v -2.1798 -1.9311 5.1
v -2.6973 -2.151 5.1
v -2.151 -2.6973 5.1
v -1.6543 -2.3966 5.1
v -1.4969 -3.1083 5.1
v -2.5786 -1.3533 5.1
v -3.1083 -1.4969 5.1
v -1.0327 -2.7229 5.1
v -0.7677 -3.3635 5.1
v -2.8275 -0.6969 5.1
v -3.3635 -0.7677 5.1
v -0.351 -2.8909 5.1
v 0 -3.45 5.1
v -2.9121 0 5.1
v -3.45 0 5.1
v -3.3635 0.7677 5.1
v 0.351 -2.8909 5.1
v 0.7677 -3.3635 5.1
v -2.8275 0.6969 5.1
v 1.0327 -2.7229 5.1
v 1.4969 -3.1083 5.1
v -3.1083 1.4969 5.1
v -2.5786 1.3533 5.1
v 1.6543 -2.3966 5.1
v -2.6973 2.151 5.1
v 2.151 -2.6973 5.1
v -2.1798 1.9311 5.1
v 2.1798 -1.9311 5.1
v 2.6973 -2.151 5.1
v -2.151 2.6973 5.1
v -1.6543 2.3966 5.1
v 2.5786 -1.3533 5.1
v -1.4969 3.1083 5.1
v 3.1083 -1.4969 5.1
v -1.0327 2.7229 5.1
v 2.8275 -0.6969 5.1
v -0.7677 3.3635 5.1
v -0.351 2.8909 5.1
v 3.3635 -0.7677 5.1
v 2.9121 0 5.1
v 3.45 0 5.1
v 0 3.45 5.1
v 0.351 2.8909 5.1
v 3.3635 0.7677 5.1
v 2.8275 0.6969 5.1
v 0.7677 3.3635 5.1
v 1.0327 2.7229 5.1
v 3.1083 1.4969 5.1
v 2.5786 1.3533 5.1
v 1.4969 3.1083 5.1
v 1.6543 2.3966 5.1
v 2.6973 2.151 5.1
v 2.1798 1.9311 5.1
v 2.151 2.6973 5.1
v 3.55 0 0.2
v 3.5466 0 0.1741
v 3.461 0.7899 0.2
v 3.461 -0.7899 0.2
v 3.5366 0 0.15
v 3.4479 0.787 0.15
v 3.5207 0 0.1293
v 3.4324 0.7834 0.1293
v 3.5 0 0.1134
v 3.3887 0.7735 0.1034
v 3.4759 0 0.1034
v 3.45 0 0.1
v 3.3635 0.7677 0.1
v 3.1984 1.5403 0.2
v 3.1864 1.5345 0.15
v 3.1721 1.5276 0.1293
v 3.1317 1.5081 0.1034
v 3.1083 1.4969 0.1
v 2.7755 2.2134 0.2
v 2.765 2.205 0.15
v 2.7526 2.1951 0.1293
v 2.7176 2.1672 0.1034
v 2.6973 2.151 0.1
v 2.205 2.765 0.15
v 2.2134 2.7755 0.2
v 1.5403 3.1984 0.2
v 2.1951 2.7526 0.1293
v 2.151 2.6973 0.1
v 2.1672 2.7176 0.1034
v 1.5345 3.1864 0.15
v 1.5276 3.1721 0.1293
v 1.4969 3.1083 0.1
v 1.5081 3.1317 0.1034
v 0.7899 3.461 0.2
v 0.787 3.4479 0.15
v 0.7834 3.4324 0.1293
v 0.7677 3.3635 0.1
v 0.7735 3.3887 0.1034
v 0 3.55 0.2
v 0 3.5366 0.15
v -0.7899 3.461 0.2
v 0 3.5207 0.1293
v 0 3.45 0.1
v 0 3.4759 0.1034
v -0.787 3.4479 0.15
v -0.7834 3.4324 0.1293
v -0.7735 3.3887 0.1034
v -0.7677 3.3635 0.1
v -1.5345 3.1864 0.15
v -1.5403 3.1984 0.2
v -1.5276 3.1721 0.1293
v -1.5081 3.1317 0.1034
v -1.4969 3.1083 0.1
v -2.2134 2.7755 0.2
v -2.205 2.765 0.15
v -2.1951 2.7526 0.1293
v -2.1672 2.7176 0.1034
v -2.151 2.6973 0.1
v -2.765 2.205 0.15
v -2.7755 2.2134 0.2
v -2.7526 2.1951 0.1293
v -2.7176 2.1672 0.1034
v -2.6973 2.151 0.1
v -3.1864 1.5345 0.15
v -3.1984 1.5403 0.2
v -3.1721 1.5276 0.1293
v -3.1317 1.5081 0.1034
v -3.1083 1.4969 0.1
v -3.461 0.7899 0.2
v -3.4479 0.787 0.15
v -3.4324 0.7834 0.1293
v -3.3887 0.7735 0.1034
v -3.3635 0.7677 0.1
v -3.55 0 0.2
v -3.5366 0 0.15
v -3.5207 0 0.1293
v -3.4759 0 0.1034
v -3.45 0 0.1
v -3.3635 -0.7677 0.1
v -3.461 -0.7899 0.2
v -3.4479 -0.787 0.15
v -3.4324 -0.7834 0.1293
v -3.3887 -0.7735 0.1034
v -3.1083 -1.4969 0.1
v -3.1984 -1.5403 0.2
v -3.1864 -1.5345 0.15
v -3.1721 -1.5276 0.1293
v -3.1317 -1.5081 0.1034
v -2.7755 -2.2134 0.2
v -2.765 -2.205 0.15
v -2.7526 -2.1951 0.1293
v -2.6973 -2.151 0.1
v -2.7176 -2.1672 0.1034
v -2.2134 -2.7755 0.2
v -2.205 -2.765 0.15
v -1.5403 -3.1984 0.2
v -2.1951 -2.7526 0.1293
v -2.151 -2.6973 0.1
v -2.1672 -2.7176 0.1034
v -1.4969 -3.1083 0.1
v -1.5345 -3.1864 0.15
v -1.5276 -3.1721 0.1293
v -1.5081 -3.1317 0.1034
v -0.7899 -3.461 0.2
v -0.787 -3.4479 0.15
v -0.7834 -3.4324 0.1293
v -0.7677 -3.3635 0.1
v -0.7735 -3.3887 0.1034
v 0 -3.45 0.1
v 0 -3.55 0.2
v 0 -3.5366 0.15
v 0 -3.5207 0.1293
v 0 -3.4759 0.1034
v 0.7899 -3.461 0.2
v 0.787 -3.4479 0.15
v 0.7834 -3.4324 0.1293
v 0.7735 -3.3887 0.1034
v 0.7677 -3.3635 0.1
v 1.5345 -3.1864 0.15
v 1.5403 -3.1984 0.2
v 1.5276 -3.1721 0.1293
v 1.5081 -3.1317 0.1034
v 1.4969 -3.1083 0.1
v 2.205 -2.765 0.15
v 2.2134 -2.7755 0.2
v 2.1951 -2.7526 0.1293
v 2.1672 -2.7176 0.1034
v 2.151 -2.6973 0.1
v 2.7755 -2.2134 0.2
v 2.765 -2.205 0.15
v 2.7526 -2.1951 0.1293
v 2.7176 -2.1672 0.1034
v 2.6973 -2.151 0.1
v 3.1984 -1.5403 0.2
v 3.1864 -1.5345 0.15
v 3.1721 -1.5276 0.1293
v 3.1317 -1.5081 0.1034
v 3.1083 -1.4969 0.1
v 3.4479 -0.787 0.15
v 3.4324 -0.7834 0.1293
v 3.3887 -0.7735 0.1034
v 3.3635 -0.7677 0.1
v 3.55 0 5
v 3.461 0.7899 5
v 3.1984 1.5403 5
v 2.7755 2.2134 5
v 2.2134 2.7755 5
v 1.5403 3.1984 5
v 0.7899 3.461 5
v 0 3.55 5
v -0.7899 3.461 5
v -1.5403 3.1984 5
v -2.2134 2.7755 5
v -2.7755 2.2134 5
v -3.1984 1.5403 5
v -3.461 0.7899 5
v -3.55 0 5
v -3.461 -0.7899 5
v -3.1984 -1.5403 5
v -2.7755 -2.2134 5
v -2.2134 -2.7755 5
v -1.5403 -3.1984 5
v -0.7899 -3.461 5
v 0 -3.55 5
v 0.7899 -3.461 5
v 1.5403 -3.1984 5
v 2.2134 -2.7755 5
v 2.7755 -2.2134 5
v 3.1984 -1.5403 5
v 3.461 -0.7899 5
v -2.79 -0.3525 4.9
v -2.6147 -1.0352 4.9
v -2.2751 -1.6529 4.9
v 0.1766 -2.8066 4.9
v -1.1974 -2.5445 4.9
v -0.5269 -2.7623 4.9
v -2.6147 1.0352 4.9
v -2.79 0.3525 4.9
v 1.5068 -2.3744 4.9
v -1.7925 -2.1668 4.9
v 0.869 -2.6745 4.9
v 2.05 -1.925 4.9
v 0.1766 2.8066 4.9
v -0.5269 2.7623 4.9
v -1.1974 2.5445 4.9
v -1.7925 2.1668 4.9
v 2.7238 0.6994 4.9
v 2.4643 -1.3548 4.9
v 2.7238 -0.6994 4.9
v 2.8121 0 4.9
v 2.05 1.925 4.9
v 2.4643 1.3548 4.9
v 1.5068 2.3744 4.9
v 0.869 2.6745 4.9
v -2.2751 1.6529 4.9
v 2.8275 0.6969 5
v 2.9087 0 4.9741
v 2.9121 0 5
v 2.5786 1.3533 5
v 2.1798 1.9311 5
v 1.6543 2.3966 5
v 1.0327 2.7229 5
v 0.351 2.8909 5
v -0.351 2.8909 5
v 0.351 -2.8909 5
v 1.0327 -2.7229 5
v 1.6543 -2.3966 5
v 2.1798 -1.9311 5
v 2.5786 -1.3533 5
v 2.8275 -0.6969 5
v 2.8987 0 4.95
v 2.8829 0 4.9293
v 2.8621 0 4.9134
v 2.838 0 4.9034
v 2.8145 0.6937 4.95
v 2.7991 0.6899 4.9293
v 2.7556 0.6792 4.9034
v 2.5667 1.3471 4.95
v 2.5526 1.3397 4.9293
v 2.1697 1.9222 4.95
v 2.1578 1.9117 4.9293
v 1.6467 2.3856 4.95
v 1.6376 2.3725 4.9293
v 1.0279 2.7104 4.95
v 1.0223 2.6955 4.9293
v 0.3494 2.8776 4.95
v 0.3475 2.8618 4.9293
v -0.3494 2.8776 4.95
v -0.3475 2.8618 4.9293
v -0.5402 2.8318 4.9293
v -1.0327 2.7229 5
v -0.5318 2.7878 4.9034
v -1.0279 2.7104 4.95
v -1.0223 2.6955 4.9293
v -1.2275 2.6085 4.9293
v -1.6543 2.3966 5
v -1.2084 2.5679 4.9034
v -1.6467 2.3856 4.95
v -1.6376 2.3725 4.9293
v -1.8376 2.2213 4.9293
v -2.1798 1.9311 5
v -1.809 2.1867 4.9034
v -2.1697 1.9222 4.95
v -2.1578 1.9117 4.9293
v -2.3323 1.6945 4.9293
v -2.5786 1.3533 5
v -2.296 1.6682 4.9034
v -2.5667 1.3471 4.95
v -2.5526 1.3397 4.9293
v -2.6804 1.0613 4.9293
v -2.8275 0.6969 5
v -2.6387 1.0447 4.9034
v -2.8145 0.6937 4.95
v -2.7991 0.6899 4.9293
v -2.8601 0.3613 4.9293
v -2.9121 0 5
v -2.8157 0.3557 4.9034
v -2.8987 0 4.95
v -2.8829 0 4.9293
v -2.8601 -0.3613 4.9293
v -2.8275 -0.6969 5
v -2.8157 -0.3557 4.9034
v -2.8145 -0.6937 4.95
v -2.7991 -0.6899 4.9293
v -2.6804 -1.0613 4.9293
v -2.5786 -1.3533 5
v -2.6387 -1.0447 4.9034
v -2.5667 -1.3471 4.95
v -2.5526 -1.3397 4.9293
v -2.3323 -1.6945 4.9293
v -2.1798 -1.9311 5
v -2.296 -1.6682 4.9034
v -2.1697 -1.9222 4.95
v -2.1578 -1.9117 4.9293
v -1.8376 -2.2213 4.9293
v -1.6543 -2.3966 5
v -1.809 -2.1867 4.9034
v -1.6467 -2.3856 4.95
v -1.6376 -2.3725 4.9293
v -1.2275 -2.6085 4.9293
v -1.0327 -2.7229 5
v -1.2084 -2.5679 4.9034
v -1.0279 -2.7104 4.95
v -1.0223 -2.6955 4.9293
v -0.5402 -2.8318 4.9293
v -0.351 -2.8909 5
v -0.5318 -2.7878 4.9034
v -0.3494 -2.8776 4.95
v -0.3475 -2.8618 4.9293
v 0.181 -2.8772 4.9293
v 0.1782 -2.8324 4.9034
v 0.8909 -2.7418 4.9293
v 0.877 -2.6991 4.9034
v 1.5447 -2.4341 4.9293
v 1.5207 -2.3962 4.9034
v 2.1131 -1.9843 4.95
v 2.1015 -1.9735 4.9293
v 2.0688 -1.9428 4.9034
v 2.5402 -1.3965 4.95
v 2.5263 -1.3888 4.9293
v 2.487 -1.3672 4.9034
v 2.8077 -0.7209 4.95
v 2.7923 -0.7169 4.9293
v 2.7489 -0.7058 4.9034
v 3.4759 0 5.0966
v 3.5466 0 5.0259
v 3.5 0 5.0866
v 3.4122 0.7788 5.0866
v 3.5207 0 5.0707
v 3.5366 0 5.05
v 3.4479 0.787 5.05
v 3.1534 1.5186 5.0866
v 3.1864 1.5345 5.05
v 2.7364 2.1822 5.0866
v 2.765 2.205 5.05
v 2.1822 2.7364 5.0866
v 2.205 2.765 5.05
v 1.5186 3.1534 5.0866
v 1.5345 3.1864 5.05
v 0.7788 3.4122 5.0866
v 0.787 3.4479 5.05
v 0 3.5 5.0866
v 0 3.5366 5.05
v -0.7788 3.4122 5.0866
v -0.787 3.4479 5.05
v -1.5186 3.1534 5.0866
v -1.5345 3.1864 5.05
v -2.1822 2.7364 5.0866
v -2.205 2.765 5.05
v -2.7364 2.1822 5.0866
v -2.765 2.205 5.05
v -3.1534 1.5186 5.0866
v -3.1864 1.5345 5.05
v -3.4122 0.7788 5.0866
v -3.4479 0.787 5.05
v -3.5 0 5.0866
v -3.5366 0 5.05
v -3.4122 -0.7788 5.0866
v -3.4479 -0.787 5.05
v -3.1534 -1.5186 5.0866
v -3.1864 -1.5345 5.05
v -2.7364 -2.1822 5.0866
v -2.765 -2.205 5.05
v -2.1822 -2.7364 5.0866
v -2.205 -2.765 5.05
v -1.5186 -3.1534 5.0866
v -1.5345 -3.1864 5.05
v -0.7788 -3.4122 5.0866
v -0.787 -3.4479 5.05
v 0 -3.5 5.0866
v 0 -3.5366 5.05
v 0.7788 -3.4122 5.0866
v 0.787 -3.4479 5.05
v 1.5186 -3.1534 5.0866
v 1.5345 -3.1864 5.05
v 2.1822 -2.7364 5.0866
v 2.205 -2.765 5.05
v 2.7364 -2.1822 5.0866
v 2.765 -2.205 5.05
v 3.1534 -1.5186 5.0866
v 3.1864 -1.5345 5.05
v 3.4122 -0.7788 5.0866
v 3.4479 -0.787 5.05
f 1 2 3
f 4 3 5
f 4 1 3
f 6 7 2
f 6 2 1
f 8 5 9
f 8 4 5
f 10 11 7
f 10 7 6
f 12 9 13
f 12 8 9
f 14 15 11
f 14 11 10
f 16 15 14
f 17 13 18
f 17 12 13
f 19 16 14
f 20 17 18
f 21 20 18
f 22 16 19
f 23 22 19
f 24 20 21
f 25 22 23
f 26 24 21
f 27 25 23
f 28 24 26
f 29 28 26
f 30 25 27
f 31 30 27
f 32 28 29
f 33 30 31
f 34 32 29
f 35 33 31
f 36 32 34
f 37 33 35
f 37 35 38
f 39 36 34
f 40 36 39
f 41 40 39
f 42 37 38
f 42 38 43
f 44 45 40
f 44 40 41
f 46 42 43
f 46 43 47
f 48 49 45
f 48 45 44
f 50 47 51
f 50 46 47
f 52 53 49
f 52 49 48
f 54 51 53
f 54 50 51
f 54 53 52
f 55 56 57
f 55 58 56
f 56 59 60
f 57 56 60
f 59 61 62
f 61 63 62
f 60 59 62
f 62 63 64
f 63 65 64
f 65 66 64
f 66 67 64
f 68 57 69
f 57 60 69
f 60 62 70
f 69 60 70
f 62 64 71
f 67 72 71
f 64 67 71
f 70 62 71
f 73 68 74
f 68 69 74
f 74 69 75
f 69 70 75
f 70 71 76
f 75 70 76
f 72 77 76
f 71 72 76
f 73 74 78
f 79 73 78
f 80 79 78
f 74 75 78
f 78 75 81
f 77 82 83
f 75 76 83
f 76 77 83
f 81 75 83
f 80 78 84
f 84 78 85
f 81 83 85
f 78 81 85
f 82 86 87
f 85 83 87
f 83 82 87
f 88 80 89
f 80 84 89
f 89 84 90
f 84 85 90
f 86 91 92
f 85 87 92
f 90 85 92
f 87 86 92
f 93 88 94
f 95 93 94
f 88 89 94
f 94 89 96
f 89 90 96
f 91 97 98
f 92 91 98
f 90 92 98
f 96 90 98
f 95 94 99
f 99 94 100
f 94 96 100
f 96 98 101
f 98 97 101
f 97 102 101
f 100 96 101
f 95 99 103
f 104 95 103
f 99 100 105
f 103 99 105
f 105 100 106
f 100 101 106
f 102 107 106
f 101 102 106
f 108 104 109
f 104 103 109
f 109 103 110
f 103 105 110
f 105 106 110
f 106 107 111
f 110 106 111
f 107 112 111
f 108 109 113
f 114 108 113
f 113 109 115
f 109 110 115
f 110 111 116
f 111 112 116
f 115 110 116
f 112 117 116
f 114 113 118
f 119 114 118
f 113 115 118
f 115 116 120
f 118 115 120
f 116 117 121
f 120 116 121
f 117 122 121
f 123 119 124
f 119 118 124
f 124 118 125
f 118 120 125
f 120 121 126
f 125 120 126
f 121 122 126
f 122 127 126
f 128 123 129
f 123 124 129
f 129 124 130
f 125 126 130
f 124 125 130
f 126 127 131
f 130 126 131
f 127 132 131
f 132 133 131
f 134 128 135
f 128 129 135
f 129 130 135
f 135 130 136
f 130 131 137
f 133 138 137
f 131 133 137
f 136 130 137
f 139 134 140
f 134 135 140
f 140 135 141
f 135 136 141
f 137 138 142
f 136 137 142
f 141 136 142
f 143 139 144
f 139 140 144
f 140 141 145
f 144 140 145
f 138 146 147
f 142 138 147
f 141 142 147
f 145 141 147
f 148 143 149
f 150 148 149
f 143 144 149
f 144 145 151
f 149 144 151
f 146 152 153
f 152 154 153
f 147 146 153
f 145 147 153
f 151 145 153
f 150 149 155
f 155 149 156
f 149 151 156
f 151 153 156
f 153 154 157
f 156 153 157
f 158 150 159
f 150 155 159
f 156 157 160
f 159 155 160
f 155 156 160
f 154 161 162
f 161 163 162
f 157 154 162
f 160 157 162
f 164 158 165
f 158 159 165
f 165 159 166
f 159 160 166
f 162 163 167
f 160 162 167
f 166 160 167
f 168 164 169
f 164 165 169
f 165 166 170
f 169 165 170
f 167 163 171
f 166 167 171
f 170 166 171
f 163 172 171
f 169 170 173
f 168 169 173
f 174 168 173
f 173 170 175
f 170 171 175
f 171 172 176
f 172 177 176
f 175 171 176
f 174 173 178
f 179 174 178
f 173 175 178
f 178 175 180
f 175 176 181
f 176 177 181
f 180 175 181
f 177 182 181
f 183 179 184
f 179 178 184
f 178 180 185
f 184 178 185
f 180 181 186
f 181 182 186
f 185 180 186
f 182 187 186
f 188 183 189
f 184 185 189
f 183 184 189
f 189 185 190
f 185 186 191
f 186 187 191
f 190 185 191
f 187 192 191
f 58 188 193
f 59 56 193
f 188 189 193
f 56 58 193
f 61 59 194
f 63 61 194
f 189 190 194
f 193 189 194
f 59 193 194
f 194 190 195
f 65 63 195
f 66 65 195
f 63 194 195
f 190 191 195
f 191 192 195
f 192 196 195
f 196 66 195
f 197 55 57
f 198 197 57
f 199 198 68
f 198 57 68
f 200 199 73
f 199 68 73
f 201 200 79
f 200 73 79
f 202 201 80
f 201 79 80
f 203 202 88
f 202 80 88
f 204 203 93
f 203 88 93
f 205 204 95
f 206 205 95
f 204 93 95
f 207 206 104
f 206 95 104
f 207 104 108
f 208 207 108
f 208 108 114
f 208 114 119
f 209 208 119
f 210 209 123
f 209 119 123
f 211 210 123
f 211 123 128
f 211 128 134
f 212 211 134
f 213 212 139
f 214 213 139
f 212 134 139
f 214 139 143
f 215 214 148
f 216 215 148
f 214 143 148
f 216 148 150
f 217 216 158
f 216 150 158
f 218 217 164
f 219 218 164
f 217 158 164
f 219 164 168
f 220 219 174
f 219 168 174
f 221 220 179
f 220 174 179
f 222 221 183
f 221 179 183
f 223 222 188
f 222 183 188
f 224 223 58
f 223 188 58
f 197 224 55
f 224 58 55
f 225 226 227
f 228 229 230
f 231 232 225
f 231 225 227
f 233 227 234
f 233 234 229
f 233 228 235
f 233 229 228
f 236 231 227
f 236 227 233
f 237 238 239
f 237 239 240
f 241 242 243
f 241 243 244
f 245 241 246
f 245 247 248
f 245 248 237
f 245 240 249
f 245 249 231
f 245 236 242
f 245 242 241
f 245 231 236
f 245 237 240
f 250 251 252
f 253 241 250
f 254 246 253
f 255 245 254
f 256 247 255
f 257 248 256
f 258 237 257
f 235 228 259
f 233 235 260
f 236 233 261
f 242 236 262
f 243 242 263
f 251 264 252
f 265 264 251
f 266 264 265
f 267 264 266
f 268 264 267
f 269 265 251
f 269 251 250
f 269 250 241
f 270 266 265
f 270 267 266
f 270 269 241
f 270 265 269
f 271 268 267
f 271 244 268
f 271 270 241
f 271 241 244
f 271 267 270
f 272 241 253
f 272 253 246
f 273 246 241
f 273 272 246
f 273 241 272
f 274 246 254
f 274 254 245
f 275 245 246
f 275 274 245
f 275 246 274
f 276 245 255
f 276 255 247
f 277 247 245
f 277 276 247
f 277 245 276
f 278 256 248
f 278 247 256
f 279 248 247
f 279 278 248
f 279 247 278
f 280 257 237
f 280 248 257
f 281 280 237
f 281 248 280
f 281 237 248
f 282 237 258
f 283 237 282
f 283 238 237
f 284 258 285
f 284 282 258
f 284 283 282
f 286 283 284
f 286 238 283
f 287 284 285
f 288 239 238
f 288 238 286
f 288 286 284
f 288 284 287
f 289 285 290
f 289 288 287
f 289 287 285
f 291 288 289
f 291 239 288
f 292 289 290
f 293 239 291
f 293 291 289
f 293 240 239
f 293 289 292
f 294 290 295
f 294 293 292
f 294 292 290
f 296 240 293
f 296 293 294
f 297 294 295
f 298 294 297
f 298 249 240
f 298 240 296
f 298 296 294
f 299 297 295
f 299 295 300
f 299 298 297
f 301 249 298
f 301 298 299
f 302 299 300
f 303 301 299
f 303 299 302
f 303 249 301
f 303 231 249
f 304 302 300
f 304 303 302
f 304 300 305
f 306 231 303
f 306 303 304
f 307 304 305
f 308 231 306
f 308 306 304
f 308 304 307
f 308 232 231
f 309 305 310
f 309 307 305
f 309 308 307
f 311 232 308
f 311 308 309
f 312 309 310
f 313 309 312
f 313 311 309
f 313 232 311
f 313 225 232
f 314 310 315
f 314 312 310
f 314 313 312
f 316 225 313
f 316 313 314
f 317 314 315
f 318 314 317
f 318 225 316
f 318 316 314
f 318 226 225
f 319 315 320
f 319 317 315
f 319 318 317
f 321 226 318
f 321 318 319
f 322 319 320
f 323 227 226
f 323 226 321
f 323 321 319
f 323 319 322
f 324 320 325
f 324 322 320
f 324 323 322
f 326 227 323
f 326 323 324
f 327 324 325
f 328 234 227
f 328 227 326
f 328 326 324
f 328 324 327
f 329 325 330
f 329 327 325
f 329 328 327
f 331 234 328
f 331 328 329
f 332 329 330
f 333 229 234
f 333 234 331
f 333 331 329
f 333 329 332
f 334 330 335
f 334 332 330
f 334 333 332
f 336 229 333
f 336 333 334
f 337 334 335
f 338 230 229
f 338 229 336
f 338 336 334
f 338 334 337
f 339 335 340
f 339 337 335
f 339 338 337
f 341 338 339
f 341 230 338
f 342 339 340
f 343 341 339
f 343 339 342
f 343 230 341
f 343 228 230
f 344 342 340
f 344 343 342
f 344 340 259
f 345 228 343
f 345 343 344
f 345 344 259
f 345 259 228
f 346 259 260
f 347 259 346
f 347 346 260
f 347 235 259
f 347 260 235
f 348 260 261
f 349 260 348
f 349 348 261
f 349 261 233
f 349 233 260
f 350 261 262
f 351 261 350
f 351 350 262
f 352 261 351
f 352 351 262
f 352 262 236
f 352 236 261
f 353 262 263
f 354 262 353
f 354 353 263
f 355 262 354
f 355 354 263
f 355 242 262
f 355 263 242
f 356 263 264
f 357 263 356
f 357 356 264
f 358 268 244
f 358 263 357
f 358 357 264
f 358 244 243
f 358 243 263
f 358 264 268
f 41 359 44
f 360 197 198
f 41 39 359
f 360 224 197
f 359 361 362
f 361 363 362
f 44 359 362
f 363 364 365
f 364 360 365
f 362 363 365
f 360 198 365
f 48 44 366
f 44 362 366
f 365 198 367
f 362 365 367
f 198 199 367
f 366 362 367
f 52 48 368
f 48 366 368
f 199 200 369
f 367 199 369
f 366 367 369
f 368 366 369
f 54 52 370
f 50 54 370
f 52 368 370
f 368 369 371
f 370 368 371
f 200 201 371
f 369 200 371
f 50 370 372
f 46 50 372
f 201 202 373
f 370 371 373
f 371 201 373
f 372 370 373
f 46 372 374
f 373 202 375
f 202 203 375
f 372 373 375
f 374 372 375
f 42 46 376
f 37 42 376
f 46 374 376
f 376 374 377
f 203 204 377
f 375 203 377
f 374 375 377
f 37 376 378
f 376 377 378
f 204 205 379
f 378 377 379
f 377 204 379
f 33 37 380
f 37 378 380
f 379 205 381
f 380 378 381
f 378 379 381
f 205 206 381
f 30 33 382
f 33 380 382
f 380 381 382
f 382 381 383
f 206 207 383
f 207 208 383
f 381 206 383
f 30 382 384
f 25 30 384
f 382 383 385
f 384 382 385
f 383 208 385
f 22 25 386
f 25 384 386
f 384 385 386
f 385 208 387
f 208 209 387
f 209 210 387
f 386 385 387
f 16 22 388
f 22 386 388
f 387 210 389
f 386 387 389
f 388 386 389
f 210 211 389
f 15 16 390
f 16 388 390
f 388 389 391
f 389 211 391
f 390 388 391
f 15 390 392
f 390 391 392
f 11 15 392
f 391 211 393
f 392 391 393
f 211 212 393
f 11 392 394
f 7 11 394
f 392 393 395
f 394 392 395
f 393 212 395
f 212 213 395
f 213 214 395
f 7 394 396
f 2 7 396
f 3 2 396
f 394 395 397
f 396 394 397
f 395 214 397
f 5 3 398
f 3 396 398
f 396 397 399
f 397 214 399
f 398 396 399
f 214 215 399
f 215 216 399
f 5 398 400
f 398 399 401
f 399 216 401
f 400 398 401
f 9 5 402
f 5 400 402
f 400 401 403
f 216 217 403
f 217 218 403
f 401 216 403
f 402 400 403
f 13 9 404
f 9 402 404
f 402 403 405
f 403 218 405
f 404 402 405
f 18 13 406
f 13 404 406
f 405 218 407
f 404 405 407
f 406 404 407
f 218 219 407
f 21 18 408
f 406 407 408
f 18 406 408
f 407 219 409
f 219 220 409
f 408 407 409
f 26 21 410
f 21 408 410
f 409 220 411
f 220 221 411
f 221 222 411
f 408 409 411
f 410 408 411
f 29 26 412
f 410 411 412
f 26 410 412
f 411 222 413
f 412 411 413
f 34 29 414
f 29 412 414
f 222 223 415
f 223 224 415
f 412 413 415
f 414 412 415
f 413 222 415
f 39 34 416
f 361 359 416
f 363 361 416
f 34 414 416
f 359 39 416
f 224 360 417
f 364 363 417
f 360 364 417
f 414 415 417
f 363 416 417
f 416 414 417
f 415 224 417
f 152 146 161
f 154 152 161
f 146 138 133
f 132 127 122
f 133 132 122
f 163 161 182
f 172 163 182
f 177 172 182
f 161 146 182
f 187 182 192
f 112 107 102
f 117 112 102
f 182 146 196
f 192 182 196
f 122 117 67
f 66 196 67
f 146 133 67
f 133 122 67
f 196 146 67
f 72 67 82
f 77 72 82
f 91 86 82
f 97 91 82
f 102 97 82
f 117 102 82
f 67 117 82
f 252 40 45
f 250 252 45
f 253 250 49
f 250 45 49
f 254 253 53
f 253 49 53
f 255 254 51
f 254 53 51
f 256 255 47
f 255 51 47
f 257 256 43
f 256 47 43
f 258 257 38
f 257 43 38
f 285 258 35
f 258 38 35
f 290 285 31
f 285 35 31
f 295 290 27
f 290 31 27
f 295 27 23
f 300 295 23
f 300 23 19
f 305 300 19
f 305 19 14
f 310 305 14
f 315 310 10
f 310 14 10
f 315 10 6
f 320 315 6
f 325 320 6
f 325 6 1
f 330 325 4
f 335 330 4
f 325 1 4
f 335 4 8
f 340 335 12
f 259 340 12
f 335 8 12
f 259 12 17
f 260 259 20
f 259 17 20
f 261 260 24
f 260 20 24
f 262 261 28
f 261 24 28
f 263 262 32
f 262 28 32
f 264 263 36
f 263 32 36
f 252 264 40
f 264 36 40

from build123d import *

# Parameters (mm, degrees)
SKETCH_R        = 3.55
PAD_DEPTH       = 5
SKETCH004_R     = 2.912147
POCKET001_DEPTH = 0.2
FILLET001_R     = 0.1
FILLET002_R     = 0.1


with BuildPart() as part:
    # Sketch → Pad (new body)
    with BuildSketch(Plane.XY.offset(0.1)):
        Circle(SKETCH_R)
    extrude(amount=PAD_DEPTH)

    # Sketch004 → Pocket001 (cut)
    with BuildSketch(Plane.XY.offset(5.1)):
        Circle(SKETCH004_R)
    extrude(amount=-POCKET001_DEPTH, mode=Mode.SUBTRACT)

    # Fillet001
    fillet001_edges = [part.edges().sort_by_distance(p)[0] for p in [
        (-2.912147, 0, 4.9),
    ]]
    fillet(fillet001_edges, radius=FILLET001_R)

    # Fillet002
    fillet002_edges = [part.edges().sort_by_distance(p)[0] for p in [
        (-3.55, 0, 0.1),
        (-3.55, 0, 5.1),
    ]]
    fillet(fillet002_edges, radius=FILLET002_R)


solid = part.part
